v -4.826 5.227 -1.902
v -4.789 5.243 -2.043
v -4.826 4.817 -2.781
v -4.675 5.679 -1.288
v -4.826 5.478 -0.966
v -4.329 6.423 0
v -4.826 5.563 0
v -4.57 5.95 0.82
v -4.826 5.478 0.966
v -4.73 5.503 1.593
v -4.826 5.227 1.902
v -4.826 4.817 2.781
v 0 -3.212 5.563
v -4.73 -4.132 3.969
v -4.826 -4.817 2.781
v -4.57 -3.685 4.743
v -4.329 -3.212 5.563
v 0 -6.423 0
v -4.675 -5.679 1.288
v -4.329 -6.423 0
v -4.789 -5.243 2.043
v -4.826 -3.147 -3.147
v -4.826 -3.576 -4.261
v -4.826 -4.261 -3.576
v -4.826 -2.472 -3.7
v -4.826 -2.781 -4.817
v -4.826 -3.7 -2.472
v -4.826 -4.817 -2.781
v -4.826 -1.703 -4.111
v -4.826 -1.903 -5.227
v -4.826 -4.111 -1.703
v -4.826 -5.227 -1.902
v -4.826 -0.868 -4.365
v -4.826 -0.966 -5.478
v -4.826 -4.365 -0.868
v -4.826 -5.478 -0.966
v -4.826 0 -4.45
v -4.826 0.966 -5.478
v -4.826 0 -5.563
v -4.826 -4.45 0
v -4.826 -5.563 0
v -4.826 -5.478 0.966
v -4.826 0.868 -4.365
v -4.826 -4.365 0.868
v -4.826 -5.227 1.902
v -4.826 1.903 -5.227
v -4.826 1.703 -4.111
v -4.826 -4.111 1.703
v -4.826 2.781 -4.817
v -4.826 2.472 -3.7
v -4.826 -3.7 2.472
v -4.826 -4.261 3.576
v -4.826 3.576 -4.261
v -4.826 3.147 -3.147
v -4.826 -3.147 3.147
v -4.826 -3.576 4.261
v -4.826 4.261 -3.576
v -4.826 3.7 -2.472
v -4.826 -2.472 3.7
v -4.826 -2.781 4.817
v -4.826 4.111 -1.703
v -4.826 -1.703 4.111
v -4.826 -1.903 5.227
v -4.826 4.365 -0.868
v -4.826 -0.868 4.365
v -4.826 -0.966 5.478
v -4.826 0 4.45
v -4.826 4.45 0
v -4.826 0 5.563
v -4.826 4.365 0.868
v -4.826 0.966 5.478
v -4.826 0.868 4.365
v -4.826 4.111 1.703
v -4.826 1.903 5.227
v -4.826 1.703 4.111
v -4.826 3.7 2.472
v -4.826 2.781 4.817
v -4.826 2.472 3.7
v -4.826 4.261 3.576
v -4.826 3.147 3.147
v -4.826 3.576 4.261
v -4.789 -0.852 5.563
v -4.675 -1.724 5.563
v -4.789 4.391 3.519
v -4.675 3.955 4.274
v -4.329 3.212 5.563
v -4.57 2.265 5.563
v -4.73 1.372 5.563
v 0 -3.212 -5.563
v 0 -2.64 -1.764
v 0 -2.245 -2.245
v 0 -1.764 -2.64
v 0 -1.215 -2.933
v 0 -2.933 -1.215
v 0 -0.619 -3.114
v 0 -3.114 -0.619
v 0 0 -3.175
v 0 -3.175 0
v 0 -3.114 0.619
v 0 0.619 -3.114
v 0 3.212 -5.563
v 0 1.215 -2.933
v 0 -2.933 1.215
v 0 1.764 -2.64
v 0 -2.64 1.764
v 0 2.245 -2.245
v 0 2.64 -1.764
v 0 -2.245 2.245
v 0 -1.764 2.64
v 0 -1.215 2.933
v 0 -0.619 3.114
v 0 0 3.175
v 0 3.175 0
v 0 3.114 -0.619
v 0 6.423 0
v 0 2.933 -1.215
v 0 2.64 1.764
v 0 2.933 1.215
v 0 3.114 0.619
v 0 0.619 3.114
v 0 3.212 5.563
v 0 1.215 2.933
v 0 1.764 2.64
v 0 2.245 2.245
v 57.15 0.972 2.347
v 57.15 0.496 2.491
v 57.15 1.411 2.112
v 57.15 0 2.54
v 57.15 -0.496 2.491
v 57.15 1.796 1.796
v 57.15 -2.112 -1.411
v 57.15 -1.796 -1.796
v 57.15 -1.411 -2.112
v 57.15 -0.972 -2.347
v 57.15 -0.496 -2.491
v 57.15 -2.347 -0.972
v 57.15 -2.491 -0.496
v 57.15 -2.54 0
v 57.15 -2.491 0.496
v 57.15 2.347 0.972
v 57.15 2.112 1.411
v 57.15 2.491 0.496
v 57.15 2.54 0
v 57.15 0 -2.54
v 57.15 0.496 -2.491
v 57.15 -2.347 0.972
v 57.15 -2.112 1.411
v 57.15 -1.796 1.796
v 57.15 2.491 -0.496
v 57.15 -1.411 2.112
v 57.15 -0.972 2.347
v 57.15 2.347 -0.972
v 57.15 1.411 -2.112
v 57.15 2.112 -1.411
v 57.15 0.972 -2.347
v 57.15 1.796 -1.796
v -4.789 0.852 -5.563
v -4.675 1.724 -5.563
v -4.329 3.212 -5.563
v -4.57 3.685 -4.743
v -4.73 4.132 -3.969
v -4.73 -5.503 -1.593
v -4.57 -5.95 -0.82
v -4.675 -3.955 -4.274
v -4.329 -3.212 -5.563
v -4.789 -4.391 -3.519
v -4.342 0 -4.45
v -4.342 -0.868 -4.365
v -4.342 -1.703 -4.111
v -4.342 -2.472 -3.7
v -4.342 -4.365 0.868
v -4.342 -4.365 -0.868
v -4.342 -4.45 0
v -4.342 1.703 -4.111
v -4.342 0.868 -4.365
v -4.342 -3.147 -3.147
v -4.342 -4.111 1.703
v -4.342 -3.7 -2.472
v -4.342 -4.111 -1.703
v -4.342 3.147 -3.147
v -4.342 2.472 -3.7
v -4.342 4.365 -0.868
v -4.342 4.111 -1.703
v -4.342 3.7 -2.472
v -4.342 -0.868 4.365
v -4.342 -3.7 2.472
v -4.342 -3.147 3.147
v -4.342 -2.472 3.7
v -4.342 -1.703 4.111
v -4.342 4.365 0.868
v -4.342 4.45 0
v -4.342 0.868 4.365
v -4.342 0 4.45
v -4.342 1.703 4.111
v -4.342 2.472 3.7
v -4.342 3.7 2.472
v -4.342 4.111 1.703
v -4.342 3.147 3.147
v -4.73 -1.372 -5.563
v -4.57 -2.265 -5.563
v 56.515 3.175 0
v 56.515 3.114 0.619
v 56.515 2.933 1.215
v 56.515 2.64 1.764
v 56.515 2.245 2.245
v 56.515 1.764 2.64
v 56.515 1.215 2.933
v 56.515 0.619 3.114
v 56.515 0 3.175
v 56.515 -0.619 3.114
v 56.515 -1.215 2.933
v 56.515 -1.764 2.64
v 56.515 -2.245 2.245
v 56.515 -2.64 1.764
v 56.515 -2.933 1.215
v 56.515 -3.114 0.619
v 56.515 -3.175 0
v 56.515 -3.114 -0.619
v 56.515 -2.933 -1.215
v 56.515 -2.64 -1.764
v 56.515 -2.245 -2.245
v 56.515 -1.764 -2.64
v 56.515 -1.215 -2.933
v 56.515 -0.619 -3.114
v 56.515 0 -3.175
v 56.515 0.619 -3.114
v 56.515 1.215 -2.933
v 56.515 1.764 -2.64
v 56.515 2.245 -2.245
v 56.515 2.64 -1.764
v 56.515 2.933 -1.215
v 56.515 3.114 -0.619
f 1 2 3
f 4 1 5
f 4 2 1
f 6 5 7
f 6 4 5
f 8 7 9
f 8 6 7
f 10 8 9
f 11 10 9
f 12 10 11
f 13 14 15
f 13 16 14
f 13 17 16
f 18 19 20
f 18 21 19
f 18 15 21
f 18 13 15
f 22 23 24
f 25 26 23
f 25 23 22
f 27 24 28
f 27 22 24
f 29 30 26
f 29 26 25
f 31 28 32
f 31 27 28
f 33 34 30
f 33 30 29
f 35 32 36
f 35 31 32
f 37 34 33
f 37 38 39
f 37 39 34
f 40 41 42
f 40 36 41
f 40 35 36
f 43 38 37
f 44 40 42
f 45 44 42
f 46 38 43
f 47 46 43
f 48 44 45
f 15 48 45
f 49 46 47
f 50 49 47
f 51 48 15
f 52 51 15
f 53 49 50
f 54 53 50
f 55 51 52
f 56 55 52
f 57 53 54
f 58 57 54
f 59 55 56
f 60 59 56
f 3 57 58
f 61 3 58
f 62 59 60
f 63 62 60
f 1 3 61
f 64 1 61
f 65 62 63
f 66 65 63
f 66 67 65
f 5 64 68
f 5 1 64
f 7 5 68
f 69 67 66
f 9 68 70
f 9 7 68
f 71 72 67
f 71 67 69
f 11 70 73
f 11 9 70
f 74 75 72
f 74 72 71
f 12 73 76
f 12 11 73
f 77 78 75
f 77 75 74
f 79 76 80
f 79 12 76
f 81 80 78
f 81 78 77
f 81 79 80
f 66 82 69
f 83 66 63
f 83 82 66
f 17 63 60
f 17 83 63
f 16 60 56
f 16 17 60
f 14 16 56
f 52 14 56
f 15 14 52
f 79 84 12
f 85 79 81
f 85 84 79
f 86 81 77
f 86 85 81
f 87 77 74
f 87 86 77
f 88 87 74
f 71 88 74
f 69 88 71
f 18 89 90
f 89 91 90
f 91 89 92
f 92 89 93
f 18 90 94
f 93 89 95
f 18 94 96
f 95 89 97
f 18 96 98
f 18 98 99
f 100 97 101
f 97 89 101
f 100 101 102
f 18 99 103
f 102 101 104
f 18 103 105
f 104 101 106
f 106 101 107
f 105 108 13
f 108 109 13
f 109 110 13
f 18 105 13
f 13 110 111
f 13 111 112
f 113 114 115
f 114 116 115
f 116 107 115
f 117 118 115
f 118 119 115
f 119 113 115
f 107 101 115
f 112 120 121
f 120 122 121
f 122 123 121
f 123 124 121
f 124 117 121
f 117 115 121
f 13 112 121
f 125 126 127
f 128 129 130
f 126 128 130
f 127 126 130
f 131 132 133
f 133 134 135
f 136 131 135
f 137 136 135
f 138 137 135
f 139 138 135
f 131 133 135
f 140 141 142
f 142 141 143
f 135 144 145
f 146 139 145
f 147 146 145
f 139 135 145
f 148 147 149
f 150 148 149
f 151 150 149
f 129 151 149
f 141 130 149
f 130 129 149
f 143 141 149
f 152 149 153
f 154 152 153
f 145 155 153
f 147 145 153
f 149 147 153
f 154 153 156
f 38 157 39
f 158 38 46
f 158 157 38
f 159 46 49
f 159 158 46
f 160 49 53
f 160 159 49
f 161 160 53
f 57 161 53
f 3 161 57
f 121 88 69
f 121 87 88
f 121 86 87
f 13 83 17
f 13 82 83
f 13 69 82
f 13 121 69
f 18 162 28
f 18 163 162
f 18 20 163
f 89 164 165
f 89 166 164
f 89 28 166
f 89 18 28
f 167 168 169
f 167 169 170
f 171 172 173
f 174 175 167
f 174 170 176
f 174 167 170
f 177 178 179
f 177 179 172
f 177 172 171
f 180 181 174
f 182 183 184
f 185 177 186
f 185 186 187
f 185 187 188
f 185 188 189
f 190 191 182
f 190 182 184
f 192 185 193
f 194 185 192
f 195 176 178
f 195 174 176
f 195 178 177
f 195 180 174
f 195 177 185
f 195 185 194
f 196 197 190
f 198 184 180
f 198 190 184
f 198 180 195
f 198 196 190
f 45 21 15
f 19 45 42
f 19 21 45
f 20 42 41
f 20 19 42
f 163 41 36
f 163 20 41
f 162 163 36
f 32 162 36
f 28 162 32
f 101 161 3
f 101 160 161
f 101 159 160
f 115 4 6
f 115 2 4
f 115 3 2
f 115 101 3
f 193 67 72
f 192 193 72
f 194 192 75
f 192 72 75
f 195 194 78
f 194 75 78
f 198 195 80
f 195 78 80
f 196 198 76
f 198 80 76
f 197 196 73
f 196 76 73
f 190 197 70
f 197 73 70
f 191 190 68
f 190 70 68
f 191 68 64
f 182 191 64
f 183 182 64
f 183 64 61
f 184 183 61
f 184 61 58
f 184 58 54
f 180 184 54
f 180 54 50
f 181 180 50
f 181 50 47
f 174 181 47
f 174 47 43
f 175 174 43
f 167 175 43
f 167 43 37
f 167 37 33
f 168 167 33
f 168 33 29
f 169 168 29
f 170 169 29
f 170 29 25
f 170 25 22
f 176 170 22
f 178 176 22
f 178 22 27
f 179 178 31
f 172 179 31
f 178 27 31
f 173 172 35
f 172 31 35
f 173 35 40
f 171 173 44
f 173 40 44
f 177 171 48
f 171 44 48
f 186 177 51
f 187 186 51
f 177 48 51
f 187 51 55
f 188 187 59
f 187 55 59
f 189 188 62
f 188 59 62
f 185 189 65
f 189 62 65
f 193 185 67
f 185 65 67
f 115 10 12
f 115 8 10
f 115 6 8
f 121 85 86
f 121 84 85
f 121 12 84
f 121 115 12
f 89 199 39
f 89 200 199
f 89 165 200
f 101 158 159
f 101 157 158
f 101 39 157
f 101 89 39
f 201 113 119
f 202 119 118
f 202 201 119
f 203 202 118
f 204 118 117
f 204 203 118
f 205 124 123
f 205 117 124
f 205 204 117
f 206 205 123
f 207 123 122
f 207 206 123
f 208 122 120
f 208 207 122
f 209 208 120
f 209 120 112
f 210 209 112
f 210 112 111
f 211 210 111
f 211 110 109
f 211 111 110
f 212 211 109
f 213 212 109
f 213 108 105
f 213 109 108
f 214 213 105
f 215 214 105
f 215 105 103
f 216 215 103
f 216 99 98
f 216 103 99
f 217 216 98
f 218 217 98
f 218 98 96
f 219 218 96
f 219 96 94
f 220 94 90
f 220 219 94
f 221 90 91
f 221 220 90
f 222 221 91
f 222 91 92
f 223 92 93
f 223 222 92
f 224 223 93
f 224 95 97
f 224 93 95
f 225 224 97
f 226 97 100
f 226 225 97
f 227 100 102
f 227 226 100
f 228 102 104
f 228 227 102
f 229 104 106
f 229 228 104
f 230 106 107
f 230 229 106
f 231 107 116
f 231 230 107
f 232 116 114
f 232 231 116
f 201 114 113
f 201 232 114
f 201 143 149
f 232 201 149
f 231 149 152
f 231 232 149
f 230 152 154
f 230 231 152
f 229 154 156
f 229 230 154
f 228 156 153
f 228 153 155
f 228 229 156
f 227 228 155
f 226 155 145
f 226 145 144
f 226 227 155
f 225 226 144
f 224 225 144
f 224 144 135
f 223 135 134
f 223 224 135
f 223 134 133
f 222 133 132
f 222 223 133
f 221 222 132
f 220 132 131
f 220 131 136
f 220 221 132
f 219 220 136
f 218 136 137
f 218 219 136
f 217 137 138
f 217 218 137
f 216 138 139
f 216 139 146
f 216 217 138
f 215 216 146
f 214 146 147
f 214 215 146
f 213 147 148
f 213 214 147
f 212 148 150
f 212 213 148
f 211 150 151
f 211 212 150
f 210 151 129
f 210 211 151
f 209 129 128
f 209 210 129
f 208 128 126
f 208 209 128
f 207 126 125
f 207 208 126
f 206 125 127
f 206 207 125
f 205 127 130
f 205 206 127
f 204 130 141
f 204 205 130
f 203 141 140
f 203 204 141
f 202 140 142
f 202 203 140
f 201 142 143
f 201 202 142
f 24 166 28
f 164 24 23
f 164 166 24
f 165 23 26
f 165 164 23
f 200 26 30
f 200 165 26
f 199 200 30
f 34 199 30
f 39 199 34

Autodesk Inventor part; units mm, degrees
ref_plane "YZ Plane" through (0, 0, 0) normal (1, 0, 0) x (0, 1, 0)
ref_plane "XZ Plane" through (0, 0, 0) normal (0, 1, 0) x (-1, 0, 0)
sketch "Sketch1" plane through (0, 0, 0) normal (0, 0, 1) x (1, 0, 0)
  line L0 (0, 3.175) -> (57.15, 3.175)
  line L1 (57.15, 3.175) -> (57.15, 0)
  line L2 (57.15, 0) -> (0, 0)
  line L3 (0, 0) -> (0, 3.175)
  line L4 (0, -0.635) -> (0, 3.81) projected
  line L5 (-11.43, 0) -> (68.58, 0) projected
  dimension "d1" = 6.35
  dimension "d13" = 57.15
revolve "Body" add sketch "Sketch1" angle 360 about axis through (57.15, 0, 0) along (-1, 0, 0)
sketch "Sketch2" plane through (0, 0, 0) normal (-1, 0, 0) x (0, 0, 1)
  line L0 (0, 6.4231) -> (5.5626, 3.2116)
  line L1 (5.5626, 3.2116) -> (5.5626, -3.2116)
  line L2 (5.5626, -3.2116) -> (0, -6.4231)
  line L3 (0, -6.4231) -> (-5.5626, -3.2116)
  line L4 (-5.5626, -3.2116) -> (-5.5626, 3.2116)
  line L5 (-5.5626, 3.2116) -> (0, 6.4231)
  line L6 (-7.7876, 0) -> (7.7876, 0) projected
  line L7 (0, 8.9924) -> (0, -8.9924) projected
  point P0 (0, 0)
  point P1 (0, 0)
  point P2 (0, 0)
  dimension "d8" = 11.1252
extrude "Head" add sketch "Sketch2" along normal blind 4.826
sketch "Sketch3" plane through (-4.826, 0, 0) normal (-1, 0, 0) x (0, 0, 1)
  circle A0 centre (0, 0) radius 4.4501
  point P0 (0, 0)
  dimension "d18" = 8.9002
extrude "Indent" cut sketch "Sketch3" against normal blind 0.4836
sketch "Sketch4" plane through (0, 0, 0) normal (0, 0, 1) x (1, 0, 0)
  line L0 (-4.826, 5.5626) -> (-4.826, 6.4231)
  line L1 (-4.826, 6.4231) -> (-4.3292, 6.4231)
  line L2 (-4.3292, 6.4231) -> (-4.826, 5.5626)
  line L3 (-5.7912, 0) -> (0.9652, 0) projected
  line L4 (0, 6.4231) -> (-4.826, 6.4231) projected
  line L5 (-4.826, 3.2116) -> (-4.826, 6.4231) projected
  dimension "d4" = 30
  dimension "d17" = 11.1252
revolve "Chamfer1" cut sketch "Sketch4" angle 360 about axis through (-10, 0, 0) along (1, 0, 0)
thread "Thread" size "1/4-20 UNC" class "2A" standard "ANSI Unified Screw Threads" length 48.5775
chamfer "Chamfer2" distance 0.635 distance2 0.6351 1 edges at (57.15, -3.175, 0) measured on face at (57.15, -0.0983, 0.932)
ref_plane "Work Plane1" through (1.75, 0, 0) normal (0, 0, -1) x (1, 0, 0)
equation "\"d1\" = GD"
equation "\"d13\" = NLG"
equation "\"d8\" = SW"
equation "\"d2\" = KOH - SD"
equation "\"d18\" = KOD2"
equation "\"d4\" = ANG1"
equation "\"d17\" = SW"
equation "\"d9\" = GEL"
equation "\"d5\" = -0.5 * SPD + 0.5 * GD"
equation "\"NLG\" = 57.15"
equation "\"GD\" = NND"
equation "\"BDM\" = NND"
equation "\"KOH\" = 4.826"
equation "\"GEL\" = 48.5775"
equation "\"SW\" = 11.1252"
equation "\"SPD\" = GD1"
equation "\"SD\" = 0"
equation "\"ANG1\" = 30deg"
equation "\"GAL\" = 0.635"
equation "\"GUL\" = GAL"
equation "\"KOH2\" = 0.1 * KOH"
equation "\"KOD2\" = 0.8 * SW"
equation "\"GD1\" = 5.08"
equation "\"THREADDIA\" = 6.35"
equation "\"SDH\" = SW"
equation "\"TOA\" = 30deg"
equation "\"RR\" = 0.0635"
equation "\"NND\" = 6.35"
equation "\"SW0\" = SW"
equation "\"SD2\" = NND"
equation "\"E0\" = 1.155 * SW"
properties part number "ANSI B18.6.3 - 1/4-20 UNC - 2.25" material "Steel, Mild"
